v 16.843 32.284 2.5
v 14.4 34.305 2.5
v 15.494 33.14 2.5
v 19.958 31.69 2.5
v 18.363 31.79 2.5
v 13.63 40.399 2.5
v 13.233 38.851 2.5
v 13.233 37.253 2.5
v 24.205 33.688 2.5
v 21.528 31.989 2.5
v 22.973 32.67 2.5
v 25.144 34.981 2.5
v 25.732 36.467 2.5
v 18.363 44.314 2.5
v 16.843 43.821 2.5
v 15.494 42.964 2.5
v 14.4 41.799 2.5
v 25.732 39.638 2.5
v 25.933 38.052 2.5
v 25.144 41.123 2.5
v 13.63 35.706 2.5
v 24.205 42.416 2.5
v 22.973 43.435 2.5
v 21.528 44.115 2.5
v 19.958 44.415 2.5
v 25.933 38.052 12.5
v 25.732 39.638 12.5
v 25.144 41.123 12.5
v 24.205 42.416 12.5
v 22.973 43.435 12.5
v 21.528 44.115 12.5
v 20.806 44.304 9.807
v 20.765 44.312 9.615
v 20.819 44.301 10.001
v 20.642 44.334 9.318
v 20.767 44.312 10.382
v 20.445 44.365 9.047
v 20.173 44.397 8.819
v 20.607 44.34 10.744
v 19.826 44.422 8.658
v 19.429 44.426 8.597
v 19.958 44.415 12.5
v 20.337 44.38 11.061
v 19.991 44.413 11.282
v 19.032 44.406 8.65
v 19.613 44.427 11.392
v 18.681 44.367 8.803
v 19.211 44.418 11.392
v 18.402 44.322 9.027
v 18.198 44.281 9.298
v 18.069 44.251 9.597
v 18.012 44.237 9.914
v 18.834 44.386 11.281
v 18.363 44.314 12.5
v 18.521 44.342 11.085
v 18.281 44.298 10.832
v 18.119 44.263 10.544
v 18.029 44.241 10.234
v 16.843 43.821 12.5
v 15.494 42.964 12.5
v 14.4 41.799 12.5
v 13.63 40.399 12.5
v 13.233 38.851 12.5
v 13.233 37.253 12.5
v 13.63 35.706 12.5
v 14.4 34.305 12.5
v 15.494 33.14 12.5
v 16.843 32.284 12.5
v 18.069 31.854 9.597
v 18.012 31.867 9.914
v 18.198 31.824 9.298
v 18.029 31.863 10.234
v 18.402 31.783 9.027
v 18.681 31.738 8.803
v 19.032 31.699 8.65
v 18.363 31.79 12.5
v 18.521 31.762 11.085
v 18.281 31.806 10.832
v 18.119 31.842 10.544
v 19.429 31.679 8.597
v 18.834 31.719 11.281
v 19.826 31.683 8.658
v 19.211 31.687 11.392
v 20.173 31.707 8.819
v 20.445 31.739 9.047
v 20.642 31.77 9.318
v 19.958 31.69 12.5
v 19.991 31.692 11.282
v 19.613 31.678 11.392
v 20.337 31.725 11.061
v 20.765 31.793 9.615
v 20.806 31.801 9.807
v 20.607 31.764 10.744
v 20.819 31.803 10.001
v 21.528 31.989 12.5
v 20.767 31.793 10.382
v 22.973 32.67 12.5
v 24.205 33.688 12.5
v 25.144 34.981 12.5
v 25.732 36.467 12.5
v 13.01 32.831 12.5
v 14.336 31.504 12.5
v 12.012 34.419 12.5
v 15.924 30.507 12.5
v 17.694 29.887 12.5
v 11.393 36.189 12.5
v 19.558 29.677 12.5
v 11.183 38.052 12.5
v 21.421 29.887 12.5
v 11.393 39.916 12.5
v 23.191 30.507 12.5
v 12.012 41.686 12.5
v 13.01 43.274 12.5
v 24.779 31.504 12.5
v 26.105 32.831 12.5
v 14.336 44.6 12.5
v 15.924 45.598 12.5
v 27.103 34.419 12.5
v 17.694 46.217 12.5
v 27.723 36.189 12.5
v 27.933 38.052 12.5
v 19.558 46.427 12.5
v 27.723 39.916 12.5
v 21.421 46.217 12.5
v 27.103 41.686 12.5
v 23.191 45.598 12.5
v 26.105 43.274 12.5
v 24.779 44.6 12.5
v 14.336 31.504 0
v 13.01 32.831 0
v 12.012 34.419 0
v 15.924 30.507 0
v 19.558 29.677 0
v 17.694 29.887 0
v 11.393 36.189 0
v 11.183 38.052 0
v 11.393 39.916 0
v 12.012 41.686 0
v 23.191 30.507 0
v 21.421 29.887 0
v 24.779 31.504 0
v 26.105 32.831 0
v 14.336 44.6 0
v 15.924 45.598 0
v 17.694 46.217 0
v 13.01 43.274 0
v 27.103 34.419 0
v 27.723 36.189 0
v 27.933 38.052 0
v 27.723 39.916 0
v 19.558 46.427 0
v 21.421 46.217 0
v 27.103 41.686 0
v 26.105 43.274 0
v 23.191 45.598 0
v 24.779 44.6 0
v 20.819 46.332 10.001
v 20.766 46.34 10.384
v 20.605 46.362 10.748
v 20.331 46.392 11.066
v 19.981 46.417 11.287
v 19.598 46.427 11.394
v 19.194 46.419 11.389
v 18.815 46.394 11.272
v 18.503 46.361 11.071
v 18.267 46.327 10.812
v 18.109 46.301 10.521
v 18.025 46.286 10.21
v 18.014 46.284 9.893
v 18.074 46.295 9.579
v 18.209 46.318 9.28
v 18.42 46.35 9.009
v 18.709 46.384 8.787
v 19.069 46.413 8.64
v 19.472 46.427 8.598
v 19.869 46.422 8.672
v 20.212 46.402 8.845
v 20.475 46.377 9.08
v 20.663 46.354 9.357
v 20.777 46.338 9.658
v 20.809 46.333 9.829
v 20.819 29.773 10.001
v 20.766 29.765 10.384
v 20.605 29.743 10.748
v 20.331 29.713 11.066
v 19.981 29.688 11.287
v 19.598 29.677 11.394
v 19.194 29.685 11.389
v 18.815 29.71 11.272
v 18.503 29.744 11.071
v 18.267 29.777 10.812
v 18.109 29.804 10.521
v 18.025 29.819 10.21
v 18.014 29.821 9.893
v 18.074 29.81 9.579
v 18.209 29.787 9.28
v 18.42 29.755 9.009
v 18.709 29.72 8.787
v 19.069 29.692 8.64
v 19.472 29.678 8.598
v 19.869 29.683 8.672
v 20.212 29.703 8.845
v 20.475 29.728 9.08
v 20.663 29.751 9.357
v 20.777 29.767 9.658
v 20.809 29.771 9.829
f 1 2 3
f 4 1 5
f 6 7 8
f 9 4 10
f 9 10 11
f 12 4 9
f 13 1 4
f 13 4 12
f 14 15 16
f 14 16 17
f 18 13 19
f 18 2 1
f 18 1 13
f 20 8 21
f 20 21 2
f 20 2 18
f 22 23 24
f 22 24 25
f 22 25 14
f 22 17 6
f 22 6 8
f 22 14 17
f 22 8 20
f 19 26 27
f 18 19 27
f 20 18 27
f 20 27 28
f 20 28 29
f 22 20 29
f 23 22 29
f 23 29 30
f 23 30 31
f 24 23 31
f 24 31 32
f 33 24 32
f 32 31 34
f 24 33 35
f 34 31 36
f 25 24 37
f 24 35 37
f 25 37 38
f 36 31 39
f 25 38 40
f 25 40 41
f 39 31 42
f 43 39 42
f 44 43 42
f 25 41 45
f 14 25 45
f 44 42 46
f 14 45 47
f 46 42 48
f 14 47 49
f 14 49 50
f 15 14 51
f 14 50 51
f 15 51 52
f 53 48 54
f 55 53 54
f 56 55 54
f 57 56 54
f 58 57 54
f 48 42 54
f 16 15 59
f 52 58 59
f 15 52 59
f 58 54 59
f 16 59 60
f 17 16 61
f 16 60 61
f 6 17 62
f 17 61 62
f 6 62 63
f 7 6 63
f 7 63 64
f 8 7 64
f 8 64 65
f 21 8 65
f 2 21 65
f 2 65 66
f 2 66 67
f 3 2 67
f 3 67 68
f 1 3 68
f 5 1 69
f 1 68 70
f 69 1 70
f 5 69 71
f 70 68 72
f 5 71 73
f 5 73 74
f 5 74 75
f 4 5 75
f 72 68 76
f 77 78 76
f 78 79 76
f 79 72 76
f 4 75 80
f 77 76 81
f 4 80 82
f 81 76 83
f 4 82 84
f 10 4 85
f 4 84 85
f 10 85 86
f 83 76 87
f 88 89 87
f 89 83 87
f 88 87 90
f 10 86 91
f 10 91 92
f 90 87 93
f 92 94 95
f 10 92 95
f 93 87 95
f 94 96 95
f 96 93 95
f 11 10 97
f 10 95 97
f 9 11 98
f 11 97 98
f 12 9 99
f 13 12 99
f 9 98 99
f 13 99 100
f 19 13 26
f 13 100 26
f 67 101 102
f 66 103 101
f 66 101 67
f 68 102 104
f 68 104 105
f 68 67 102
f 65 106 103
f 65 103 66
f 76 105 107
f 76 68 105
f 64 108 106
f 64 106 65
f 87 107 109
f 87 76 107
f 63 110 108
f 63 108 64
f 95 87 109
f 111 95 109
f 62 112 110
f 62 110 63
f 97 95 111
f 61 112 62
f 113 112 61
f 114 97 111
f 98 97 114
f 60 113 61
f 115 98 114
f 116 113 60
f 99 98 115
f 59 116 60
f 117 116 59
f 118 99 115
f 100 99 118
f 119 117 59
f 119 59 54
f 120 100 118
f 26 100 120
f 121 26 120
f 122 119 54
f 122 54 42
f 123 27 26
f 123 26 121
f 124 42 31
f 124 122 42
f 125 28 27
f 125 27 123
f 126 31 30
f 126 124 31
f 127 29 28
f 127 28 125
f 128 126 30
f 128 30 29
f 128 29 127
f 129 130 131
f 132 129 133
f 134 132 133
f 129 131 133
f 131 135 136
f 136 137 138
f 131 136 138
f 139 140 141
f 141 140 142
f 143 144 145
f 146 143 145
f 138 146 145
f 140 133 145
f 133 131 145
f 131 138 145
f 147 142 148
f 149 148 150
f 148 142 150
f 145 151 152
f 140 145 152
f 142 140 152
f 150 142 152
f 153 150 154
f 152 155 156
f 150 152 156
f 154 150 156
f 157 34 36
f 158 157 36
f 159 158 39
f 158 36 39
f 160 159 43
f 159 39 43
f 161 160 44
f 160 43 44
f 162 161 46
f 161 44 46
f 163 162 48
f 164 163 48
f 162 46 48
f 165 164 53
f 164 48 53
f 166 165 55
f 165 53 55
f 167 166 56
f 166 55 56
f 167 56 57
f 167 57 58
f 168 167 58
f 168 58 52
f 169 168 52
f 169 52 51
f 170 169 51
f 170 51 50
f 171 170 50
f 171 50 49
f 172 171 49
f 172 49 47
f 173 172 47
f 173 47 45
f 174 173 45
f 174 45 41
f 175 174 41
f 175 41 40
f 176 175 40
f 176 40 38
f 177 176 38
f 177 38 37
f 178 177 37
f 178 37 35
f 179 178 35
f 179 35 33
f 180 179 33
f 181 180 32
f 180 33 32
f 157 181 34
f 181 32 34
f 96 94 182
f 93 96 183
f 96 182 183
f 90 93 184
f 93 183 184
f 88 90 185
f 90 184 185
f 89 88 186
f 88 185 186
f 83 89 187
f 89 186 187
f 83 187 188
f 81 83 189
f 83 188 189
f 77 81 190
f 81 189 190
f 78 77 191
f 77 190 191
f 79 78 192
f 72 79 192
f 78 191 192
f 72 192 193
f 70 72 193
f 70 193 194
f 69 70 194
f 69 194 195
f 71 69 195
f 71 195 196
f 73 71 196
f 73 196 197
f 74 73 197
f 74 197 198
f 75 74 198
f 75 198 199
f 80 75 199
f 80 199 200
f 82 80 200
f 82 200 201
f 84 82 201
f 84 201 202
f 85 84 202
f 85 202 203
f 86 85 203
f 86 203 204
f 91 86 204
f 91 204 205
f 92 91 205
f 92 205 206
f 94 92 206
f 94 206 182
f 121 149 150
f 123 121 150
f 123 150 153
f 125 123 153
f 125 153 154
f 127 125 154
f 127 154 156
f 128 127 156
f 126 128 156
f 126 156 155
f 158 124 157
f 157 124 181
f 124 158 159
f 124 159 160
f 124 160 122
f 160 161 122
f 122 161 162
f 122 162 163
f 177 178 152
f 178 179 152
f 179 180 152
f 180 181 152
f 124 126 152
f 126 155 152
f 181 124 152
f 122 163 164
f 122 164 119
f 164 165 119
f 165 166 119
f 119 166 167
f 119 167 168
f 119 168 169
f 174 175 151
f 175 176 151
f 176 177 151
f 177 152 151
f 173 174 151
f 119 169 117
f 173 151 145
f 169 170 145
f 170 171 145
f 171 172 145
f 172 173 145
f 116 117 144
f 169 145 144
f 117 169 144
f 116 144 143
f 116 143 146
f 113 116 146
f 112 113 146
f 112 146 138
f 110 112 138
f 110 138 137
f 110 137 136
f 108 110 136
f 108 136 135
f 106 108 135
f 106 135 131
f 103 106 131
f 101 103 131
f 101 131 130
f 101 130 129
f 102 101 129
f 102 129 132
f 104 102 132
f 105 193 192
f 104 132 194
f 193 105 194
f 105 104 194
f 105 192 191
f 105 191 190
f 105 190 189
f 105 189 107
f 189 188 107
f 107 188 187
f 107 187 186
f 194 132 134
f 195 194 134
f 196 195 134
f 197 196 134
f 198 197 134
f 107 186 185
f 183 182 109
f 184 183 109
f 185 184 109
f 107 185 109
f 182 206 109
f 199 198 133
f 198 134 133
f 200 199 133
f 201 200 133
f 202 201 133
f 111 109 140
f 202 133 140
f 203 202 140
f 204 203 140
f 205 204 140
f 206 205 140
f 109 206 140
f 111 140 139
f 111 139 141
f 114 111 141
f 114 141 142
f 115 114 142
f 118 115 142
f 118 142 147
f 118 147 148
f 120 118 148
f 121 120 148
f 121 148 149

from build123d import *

# Parameters (mm, degrees)
F0_R     = 8.375
F1_DEPTH = 12.5
F2_R     = 6.375
F3_DEPTH = 10
F4_R     = 1.404945
F5_DEPTH = 75


with BuildPart() as f1:
    # F0 (on Top) → F1 (new body)
    with BuildSketch(Plane.XY):
        with Locations((19.557578, 38.052302)):
            Circle(F0_R)
    extrude(amount=F1_DEPTH)

    # F2 (on face) → F3 (cut)
    with BuildSketch(Plane.XY.offset(12.5)):
        with Locations((19.557578, 38.052302)):
            Circle(F2_R)
    extrude(amount=-F3_DEPTH, mode=Mode.SUBTRACT)

    # F4 (on Front) → F5 (cut)
    with BuildSketch(Plane.XZ):
        with Locations((19.41436, 10.001411)):
            Circle(F4_R)
    extrude(amount=-F5_DEPTH, mode=Mode.SUBTRACT)


solid = f1.part
